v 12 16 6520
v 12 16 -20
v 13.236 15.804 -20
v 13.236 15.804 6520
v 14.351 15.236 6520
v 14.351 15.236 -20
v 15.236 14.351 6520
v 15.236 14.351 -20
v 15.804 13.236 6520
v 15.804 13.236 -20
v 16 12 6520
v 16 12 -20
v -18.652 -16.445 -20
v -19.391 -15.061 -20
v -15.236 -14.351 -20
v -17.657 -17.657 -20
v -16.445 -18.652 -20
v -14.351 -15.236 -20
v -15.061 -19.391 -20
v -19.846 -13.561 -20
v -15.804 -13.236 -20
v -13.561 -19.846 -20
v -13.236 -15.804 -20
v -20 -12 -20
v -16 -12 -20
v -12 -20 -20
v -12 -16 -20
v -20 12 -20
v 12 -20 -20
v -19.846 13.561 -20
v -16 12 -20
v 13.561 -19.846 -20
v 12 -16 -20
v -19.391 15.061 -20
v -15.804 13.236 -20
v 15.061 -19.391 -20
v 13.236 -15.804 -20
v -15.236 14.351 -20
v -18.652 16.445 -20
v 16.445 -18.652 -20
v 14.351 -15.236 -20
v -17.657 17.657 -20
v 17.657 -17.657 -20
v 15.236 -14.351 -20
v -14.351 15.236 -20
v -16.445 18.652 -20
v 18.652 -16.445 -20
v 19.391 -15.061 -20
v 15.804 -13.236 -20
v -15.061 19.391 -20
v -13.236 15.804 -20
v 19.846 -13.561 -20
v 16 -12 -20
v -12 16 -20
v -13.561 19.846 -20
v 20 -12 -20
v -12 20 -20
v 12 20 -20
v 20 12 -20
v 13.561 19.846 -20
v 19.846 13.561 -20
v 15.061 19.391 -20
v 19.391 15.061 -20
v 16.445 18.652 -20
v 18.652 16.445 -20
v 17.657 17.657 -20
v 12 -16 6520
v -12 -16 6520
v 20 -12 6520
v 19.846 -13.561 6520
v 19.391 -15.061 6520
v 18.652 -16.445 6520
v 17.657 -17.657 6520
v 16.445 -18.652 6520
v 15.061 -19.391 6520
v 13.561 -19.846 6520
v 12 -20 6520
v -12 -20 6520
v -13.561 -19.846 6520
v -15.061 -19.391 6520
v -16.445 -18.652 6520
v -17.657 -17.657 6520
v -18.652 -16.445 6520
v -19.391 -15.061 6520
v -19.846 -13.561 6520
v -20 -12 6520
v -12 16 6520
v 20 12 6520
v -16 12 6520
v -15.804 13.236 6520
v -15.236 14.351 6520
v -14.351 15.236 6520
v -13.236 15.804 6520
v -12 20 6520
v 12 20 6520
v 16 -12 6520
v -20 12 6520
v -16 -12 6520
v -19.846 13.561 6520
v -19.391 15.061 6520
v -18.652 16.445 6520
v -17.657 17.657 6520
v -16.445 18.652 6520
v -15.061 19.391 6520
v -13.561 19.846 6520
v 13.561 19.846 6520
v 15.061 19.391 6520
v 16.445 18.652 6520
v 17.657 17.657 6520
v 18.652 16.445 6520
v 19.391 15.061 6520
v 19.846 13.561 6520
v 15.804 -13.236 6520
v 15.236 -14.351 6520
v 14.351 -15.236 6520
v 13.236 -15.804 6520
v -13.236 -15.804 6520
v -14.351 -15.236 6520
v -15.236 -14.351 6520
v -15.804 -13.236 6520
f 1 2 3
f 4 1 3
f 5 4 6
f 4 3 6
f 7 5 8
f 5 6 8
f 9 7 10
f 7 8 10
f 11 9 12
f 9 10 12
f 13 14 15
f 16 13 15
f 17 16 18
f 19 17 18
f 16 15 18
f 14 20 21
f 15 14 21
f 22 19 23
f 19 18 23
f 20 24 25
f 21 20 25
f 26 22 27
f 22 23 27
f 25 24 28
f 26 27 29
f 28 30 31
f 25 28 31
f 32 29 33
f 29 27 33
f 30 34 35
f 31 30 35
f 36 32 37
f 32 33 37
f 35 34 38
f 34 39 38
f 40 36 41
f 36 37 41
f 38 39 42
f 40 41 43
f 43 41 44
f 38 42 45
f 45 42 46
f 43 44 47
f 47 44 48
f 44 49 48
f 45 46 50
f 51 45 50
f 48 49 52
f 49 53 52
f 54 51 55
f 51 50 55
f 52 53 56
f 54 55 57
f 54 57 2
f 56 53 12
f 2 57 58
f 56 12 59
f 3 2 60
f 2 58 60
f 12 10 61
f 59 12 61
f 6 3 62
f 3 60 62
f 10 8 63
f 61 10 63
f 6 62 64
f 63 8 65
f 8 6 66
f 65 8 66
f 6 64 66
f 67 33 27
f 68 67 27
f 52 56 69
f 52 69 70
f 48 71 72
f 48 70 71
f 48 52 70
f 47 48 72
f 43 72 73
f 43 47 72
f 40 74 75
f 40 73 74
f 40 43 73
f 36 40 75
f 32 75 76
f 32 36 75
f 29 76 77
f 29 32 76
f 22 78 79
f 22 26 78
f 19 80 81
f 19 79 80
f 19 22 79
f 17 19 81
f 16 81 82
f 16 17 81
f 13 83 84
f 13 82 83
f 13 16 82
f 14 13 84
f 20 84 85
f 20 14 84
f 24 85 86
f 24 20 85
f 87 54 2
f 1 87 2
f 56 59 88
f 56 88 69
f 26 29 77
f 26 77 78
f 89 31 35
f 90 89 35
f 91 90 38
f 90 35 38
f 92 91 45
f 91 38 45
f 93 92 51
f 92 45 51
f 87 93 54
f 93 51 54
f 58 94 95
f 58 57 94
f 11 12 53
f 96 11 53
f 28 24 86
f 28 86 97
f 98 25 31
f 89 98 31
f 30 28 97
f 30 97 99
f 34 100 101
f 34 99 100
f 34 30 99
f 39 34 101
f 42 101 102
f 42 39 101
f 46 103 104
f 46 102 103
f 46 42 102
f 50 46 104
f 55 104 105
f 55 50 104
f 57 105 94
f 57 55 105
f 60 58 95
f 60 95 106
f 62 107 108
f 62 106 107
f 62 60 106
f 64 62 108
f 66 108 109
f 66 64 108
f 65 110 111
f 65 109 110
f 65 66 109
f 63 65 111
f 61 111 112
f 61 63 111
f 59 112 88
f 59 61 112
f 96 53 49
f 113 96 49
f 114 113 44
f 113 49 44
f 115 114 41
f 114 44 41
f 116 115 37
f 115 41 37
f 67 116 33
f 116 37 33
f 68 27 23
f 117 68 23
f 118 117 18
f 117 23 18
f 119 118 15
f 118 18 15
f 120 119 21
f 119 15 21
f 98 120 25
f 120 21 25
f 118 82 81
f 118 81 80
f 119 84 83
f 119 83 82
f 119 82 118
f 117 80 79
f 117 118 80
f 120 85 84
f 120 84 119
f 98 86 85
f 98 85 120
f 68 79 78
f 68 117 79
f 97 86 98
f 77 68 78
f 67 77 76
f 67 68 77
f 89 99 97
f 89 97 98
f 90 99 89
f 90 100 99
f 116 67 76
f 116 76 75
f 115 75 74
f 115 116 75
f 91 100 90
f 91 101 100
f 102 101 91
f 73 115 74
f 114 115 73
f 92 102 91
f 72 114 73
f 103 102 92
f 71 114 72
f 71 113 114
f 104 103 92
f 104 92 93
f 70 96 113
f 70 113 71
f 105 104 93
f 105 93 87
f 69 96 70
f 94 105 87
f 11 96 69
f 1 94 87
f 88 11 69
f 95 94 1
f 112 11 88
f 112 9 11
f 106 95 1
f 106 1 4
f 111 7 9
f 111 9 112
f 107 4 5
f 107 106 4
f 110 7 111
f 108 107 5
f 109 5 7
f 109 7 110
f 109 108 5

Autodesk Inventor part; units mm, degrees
ref_plane "Start Plane" through (0, 0, -20) normal (0, 0, 1) x (1, 0, 0)
ref_plane "End Plane" through (0, 0, 6520) normal (0, 0, 1) x (1, 0, 0)
sketch "Sketch" plane through (0, 0, 0) normal (0, 0, 1) x (1, 0, 0)
  line L0 (-20, -12) -> (-20, 12)
  line L1 (-12, 20) -> (12, 20)
  line L2 (20, 12) -> (20, -12)
  line L3 (12, -20) -> (-12, -20)
  arc A0 (-20, -12) -> (-12, -20) centre (-12, -12) ccw
  arc A1 (20, 12) -> (12, 20) centre (12, 12) ccw
  arc A2 (-12, 20) -> (-20, 12) centre (-12, 12) ccw
  arc A3 (12, -20) -> (20, -12) centre (12, -12) ccw
  arc A4 (-12, 16) -> (-16, 12) centre (-12, 12) ccw
  line L4 (-12, 16) -> (12, 16)
  arc A5 (16, 12) -> (12, 16) centre (12, 12) ccw
  line L5 (16, 12) -> (16, -12)
  arc A6 (12, -16) -> (16, -12) centre (12, -12) ccw
  line L6 (12, -16) -> (-12, -16)
  arc A7 (-16, -12) -> (-12, -16) centre (-12, -12) ccw
  line L7 (-16, -12) -> (-16, 12)
  line L8 (0, 30.3196) -> (0, -30.3196) construction
  line L9 (-30.3196, 0) -> (30.3196, 0) construction
  dimension "d7" = 8
  dimension "d9" = 40
  dimension "d11" = 40
  dimension "d12" = 4
  dimension "d15" = 20
  dimension "d16" = 20
extrude "Body" add sketch "Sketch" along normal up to surface (6540 mm away) from surface at -20
sketch "Sketch3" plane through (0, 0, 0) normal (0, 0, 1) x (1, 0, 0)
  line L0 (0, 0) -> (10, 0)
ref_plane "Work Plane3" through (0, 0, 0) normal (0, -1, 0) x (1, 0, 0)
ref_plane "Work Plane6" through (-12, 0, -20) normal (0, 0, -1) x (-1, 0, 0)
split "Split3" plane through (-12, 0, -20) removes the side toward (0, 0, -1)
ref_plane "Work Plane7" through (12, -2000, 6520) normal (0, 0, 1) x (1, 0, 0)
split "Split4" plane through (12, -2000, 6520) removes the side toward (0, 0, 1)
sketch "Sketch4" plane through (0, 0, 0) normal (0, -1, 0) x (1, 0, 0)
  line L0 (-2, -20) -> (12, -20) projected
  line L1 (-2, 6520) -> (12, 6520) projected
  dimension "d18" = 6540
equation "\"d7\" = G_IR"
equation "\"d9\" = G_W"
equation "\"d11\" = G_H"
equation "\"d12\" = G_T"
equation "\"d15\" = 0.5 * d9"
equation "\"d16\" = 0.5 * d11"
equation "\"d3\" = G_L"
equation "\"G_W\" = 40"
equation "\"G_H\" = 40"
equation "\"G_T\" = 4"
equation "\"G_IR\" = 8"
equation "\"G_L\" = d18"
properties part number "ISO 10799-2 - 40x40x4 - 6540" material "Steel, Mild"
